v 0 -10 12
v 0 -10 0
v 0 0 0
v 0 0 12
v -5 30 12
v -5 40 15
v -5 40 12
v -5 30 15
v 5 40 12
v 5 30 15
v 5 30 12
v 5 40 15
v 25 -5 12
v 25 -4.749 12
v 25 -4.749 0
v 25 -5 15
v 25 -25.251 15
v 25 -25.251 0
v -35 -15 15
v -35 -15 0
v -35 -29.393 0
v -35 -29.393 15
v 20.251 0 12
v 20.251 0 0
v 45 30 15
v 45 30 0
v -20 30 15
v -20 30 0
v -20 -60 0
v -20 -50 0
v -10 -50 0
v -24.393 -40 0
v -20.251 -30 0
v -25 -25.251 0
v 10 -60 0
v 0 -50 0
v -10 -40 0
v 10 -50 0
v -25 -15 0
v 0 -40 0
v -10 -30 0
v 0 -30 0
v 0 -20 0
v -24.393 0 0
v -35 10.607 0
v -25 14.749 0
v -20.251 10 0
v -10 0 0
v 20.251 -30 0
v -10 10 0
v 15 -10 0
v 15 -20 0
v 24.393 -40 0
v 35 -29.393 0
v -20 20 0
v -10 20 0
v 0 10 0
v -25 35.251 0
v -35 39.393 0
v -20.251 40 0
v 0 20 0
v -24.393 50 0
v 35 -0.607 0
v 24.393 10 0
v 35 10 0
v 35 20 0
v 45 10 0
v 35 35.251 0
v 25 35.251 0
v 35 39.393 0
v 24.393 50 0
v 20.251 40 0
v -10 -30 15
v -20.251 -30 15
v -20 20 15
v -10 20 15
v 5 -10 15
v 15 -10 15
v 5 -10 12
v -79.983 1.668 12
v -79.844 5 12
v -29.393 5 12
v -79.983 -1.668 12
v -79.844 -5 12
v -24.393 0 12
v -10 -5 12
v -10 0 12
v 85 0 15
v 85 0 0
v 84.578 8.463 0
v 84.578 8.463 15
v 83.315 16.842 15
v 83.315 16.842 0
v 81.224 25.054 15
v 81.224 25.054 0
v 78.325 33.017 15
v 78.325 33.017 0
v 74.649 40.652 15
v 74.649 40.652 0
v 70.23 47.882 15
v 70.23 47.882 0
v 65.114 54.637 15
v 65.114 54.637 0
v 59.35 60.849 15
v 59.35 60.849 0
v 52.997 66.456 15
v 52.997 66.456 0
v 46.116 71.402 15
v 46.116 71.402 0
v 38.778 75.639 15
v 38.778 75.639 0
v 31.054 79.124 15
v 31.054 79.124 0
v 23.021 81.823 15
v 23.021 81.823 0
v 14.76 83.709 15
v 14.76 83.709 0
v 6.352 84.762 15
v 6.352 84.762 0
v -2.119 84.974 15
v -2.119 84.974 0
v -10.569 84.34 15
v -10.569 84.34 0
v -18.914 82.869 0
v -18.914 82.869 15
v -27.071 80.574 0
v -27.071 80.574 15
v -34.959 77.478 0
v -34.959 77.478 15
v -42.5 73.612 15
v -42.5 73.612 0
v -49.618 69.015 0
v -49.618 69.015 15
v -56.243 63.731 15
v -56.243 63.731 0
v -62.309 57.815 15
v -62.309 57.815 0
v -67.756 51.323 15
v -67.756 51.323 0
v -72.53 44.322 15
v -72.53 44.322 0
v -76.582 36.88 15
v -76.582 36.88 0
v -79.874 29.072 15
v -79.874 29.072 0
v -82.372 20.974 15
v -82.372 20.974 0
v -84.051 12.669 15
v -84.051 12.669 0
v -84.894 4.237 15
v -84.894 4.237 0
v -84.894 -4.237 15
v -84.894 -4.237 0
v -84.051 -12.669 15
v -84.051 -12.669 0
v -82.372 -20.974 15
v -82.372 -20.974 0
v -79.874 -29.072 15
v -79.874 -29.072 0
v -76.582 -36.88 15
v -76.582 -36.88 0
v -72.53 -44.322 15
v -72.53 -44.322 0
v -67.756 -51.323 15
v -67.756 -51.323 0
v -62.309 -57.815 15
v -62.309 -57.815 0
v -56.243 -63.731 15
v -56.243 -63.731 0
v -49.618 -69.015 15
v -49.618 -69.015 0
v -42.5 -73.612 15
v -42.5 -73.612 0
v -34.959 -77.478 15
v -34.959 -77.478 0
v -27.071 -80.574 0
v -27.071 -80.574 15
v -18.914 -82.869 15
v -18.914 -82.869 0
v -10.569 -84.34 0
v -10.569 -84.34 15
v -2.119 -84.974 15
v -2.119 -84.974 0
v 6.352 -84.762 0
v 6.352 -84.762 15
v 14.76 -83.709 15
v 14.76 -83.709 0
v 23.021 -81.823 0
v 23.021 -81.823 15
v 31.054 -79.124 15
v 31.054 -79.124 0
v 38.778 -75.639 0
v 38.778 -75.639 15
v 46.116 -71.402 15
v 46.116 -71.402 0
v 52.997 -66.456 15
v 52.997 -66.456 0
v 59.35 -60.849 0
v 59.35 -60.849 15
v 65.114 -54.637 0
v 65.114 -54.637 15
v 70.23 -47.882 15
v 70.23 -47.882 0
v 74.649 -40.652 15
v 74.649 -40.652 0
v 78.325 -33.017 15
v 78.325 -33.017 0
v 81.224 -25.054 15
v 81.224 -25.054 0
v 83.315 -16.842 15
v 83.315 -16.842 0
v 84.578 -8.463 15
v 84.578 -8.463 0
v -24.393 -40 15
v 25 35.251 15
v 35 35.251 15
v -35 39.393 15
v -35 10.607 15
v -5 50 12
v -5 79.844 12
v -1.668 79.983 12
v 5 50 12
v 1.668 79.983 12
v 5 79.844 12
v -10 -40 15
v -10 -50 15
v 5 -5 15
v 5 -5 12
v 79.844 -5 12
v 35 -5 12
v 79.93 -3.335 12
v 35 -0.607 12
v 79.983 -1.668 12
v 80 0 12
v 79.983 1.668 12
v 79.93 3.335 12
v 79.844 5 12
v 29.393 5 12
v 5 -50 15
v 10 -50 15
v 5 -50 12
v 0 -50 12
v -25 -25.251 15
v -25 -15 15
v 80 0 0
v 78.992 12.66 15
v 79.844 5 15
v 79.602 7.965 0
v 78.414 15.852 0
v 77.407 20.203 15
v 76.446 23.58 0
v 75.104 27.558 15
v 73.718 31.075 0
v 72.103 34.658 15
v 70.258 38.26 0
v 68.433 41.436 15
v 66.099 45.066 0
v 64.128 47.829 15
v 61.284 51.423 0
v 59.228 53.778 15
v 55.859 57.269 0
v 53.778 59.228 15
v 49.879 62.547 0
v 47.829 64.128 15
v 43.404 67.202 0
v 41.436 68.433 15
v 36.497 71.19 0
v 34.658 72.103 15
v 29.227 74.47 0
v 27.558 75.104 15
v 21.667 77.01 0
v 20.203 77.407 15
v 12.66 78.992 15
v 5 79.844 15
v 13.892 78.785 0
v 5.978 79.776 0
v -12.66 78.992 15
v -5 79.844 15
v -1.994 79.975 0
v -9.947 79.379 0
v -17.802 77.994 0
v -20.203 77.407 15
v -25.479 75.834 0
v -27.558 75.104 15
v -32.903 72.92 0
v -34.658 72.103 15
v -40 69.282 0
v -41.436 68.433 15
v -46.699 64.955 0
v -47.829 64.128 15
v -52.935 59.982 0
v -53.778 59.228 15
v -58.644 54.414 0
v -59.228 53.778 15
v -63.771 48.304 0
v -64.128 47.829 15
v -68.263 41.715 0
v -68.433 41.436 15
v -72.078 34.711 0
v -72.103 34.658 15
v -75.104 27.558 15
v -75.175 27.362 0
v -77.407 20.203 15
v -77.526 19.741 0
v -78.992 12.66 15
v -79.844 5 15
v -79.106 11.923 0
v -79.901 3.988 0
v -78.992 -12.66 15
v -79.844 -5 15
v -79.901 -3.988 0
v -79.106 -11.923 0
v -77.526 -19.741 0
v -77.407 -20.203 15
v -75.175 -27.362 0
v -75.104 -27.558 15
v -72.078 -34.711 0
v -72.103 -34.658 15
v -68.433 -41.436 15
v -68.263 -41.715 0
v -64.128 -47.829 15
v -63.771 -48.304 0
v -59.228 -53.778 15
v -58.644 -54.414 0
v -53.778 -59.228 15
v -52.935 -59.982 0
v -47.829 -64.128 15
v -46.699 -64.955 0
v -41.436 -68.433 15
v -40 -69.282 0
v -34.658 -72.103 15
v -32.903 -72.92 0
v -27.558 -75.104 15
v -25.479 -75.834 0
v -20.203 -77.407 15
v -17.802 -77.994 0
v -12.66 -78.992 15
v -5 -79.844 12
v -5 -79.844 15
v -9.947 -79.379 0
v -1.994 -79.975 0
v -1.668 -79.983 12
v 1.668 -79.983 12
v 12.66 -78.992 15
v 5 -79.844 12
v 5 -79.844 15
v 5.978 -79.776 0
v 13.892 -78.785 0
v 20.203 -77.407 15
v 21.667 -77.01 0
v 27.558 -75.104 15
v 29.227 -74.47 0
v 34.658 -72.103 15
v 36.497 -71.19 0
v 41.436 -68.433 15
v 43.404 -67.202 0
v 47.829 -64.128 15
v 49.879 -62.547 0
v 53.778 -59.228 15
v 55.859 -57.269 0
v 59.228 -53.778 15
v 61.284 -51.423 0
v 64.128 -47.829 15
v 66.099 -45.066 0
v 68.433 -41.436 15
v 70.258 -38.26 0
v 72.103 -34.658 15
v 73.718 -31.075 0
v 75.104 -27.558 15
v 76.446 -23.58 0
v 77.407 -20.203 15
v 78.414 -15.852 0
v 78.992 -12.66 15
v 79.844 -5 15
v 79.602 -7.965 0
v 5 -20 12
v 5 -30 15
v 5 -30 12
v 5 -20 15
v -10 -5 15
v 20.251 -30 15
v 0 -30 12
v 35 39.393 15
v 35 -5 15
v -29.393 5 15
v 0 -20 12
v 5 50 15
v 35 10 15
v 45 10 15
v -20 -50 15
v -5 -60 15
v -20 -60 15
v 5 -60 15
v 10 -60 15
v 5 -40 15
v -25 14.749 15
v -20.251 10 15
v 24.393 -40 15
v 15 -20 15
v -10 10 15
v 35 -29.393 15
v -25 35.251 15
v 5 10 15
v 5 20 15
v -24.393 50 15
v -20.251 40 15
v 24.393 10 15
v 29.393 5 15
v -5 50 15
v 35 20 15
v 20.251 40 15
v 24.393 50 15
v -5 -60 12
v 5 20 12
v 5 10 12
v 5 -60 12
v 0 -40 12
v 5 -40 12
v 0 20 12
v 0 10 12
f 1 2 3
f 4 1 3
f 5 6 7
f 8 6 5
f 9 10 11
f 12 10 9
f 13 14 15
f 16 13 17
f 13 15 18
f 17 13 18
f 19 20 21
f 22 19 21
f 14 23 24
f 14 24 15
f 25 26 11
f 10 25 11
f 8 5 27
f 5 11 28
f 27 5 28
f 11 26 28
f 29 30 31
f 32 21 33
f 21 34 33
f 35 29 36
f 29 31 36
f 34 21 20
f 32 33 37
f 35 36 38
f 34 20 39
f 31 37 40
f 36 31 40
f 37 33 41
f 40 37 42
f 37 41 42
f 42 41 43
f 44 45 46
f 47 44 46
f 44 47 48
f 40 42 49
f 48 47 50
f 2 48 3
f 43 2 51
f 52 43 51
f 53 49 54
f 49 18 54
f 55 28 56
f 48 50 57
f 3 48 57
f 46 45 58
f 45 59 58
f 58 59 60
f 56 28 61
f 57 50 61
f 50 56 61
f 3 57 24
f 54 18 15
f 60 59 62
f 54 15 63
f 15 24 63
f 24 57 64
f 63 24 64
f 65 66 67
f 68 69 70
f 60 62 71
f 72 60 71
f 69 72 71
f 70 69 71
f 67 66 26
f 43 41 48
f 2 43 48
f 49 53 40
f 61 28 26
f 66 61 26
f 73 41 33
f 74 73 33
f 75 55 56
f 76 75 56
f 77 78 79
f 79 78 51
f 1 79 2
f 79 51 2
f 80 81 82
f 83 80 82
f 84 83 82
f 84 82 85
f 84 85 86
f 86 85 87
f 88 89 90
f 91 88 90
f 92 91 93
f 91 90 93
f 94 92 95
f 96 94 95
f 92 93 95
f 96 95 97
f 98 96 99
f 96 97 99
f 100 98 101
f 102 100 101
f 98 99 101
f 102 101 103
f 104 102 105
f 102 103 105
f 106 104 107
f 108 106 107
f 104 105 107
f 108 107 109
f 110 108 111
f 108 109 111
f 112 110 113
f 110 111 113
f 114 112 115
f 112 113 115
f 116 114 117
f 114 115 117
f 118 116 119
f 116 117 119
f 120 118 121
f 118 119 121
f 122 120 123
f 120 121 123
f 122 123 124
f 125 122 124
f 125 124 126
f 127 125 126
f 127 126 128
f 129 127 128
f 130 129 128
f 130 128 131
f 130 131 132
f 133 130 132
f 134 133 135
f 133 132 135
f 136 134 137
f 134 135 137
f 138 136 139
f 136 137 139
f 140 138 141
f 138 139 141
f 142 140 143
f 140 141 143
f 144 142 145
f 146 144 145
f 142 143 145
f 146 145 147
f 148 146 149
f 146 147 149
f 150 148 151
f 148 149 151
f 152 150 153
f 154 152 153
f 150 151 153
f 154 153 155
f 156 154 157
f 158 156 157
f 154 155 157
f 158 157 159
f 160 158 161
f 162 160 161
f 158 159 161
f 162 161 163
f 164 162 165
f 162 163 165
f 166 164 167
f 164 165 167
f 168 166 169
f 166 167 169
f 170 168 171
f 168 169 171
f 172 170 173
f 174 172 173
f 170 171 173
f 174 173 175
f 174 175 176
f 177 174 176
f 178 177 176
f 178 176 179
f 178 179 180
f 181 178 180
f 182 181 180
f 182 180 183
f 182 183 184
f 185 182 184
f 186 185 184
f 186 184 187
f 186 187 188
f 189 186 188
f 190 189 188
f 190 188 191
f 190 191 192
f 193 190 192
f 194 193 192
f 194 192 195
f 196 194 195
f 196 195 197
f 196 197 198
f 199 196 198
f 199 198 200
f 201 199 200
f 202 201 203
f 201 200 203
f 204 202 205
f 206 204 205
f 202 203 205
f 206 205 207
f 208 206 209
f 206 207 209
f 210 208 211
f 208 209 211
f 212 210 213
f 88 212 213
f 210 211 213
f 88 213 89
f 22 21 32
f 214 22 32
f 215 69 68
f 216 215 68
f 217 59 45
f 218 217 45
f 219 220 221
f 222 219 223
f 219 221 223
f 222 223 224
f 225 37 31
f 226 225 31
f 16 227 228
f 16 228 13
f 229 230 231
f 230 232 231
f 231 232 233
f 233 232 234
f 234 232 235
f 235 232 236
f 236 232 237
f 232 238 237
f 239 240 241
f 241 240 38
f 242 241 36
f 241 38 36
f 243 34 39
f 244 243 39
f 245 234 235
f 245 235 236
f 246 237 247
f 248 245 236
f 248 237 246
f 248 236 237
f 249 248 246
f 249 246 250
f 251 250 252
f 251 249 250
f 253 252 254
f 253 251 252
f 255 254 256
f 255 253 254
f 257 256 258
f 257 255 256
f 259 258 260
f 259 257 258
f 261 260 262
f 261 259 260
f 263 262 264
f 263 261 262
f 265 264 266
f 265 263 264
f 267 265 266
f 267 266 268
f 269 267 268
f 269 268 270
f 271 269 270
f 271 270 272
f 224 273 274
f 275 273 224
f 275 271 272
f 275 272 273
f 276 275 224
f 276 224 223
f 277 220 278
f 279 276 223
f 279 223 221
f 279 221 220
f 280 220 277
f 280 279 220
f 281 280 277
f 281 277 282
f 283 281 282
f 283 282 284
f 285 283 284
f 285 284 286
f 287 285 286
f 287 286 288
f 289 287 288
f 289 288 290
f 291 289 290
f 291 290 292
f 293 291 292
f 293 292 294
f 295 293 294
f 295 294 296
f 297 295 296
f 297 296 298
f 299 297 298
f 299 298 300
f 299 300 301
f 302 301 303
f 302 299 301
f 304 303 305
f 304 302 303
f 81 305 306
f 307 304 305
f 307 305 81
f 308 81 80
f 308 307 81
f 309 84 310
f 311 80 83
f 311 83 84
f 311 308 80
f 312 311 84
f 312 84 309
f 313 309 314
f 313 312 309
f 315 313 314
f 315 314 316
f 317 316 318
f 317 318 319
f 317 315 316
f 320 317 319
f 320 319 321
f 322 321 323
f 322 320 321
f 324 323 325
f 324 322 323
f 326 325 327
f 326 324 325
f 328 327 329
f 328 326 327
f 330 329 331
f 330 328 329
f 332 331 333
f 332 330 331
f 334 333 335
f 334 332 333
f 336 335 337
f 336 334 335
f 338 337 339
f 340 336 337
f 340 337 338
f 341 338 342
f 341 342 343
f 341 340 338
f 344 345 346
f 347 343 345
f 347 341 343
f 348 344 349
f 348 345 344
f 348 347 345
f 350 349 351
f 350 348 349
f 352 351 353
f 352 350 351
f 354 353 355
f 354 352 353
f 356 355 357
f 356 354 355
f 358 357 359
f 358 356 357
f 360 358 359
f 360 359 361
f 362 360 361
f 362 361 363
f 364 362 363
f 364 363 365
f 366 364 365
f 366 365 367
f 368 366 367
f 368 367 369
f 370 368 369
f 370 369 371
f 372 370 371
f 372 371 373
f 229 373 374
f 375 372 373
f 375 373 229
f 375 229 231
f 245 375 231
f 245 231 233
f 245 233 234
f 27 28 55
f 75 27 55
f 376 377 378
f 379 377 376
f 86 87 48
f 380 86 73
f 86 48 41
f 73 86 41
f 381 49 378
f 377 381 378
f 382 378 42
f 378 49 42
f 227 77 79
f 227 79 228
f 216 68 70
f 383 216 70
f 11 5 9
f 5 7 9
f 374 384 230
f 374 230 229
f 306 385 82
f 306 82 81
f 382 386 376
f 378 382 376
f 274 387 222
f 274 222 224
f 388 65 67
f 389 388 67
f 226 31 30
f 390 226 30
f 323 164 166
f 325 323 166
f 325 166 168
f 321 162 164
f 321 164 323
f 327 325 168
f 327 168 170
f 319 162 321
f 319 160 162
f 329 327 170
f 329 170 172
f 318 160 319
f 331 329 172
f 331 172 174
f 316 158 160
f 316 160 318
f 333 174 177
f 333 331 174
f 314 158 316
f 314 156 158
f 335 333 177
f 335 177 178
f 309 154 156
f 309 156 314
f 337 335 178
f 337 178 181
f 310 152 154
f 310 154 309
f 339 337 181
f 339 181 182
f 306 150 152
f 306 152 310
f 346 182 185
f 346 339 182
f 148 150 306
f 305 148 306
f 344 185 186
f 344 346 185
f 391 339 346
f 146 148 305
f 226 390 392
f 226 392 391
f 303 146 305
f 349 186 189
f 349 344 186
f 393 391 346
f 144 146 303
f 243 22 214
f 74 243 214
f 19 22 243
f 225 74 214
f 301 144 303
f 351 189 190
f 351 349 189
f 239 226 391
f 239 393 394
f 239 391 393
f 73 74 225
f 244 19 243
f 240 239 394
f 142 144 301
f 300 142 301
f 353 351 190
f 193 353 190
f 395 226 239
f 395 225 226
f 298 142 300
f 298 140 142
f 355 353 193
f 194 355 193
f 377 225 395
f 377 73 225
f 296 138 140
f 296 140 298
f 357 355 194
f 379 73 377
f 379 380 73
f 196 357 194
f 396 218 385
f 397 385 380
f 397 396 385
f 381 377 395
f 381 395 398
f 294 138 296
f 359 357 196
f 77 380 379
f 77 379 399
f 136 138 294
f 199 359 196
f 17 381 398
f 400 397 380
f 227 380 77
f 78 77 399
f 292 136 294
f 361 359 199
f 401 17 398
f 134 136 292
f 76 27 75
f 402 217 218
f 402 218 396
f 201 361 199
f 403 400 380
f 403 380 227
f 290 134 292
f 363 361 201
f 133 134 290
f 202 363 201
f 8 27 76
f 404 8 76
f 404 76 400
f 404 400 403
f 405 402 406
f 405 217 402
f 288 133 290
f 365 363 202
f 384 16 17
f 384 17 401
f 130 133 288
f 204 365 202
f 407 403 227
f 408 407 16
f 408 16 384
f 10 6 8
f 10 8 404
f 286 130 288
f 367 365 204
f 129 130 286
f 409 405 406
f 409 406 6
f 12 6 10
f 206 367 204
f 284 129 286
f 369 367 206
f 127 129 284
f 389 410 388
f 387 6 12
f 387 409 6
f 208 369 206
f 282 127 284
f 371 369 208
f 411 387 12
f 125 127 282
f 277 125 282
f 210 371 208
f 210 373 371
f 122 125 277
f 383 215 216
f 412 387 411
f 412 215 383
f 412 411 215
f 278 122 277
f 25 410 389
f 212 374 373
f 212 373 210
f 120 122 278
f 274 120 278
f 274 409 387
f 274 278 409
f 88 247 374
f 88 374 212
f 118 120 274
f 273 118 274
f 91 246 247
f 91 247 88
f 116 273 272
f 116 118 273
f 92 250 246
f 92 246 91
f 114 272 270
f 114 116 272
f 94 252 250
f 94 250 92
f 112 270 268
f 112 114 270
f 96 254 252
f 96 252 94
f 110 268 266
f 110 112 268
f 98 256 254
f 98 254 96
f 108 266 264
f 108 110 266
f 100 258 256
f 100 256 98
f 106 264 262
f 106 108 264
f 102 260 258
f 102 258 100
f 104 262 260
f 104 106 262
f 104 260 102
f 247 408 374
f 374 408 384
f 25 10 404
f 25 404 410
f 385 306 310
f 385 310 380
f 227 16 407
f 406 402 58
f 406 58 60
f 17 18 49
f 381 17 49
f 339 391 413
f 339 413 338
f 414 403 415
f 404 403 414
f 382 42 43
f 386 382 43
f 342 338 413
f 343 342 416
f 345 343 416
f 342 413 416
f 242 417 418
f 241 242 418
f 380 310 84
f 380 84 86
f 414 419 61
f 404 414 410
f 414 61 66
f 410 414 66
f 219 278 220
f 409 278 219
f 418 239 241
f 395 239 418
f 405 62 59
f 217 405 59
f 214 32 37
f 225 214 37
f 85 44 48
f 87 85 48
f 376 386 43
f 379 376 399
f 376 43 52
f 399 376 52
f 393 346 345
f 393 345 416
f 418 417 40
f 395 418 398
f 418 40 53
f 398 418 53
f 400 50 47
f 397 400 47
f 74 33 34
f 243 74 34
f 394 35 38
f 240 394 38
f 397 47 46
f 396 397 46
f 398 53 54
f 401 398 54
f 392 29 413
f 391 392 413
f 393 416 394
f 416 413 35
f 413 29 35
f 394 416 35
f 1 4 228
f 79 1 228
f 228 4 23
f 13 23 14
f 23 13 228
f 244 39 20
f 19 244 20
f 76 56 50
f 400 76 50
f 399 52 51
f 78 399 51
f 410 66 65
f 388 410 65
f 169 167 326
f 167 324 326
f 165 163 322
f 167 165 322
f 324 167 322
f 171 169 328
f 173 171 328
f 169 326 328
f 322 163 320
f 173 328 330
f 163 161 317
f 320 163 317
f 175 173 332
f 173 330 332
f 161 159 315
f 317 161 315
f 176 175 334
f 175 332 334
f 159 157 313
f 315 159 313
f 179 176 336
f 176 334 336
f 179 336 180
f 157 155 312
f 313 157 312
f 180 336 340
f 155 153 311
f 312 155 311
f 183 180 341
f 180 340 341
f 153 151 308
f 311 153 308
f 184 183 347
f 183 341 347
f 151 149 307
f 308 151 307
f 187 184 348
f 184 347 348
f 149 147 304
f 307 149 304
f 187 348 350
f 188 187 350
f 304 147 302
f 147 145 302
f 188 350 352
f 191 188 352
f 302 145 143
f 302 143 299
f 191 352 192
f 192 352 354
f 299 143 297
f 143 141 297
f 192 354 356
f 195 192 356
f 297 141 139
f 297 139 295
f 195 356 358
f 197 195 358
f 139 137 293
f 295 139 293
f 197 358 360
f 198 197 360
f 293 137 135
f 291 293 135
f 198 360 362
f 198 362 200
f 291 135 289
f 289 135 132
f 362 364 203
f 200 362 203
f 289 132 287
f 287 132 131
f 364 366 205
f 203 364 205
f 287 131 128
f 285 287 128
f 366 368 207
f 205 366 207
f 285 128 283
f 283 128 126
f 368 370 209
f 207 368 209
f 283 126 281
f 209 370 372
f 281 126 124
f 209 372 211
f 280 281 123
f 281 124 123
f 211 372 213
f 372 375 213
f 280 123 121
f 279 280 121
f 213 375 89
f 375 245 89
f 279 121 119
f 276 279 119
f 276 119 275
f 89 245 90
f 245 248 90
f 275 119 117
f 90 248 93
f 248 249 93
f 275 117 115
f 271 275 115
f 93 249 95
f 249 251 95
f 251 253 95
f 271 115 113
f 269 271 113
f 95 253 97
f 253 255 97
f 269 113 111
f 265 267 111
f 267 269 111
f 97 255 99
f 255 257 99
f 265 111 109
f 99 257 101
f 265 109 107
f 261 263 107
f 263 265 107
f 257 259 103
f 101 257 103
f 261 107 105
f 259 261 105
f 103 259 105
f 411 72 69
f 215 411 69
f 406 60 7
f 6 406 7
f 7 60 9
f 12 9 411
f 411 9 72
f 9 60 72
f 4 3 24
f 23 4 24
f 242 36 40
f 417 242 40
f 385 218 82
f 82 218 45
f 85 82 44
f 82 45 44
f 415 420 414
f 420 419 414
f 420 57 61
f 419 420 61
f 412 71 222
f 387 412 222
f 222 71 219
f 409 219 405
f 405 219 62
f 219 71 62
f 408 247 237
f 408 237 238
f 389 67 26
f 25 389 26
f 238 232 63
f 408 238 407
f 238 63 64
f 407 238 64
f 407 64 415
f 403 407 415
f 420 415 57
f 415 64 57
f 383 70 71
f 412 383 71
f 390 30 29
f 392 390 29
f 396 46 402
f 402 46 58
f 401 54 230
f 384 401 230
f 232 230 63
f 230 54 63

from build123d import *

# Parameters (mm, degrees)
F4_DEPTH = 15
F5_R     = 85
F5_R_2   = 80
F6_DEPTH = 15
F7_W     = 10
F7_H     = 10
F8_DEPTH = 3


with BuildPart() as f4:
    # F3 (on Top) → F4 (new body)
    with BuildSketch(Plane.XY):
        Polygon((24.3933982822, 50), (-24.3933982822, 50), (-35, 39.3933982822), (-35, 10.6066017178), (-24.3933982822, 0), (-10, 0), (-10, -30), (-20.2512626585, -30), (-25, -25.2512626585), (-25, -15), (-35, -15), (-35, -29.3933982822), (-24.3933982822, -40), (-10, -40), (-10, -50), (-20, -50), (-20, -60), (10, -60), (10, -50), (0, -50), (0, -40), (24.3933982822, -40), (35, -29.3933982822), (35, -0.6066017178), (24.3933982822, 10), (0, 10), (0, 12.3223304703), (0, 20), (35, 20), (35, 10), (45, 10), (45, 30), (-20, 30), (-20, 20), (-10, 20), (-10, 18.4070525334), (-10, 10), (-20.2512626585, 10), (-25, 14.7487373415), (-25, 18.8908729653), (-25, 35.2512626585), (-20.2512626585, 40), (20.2512626585, 40), (25, 35.2512626585), (35, 35.2512626585), (35, 39.3933982822), align=None)
        Polygon((20.2512626585, 0), (25, -4.7487373415), (25, -25.2512626585), (20.2512626585, -30), (0, -30), (0, -20), (15, -20), (15, -10), (0, -10), (0, 0), align=None, mode=Mode.SUBTRACT)
    extrude(amount=F4_DEPTH)



with BuildPart() as f6:
    # F5 (on Top) → F6 (new body)
    with BuildSketch(Plane.XY):
        Circle(F5_R)
        Circle(F5_R_2, mode=Mode.SUBTRACT)
    extrude(amount=F6_DEPTH)


with BuildPart() as f4_1:
    add(f4.part)

    add(f6.part)  # F8 merges F6
    # F7 (on face) → F8 (join)
    with BuildSketch(Plane.XY.offset(15)):
        Rectangle(F7_W, F7_H)
        with BuildLine():
            Line((79.8435971134, 5), (5, 5))
            Line((5, 5), (5, -5))
            Line((5, -5), (79.8435971134, -5))
            ThreePointArc((79.8435971134, -5), (79.9608897183, -2.5012227941), (80, 0))
            ThreePointArc((80, 0), (79.9608897183, 2.5012227941), (79.8435971134, 5))
        make_face()
        with BuildLine():
            Line((-5, 79.8435971134), (-5, 5))
            Line((-5, 5), (5, 5))
            Line((5, 5), (5, 79.8435971134))
            ThreePointArc((5, 79.8435971134), (0, 80), (-5, 79.8435971134))
        make_face()
        with BuildLine():
            Line((-5, 5), (-79.8435971134, 5))
            ThreePointArc((-79.8435971134, 5), (-80, 0), (-79.8435971134, -5))
            Line((-79.8435971134, -5), (-5, -5))
            Line((-5, -5), (-5, 5))
        make_face()
        with BuildLine():
            Line((5, -5), (-5, -5))
            Line((-5, -5), (-5, -79.8435971134))
            ThreePointArc((-5, -79.8435971134), (0, -80), (5, -79.8435971134))
            Line((5, -79.8435971134), (5, -5))
        make_face()
    extrude(amount=-F8_DEPTH)


solid = f4_1.part
